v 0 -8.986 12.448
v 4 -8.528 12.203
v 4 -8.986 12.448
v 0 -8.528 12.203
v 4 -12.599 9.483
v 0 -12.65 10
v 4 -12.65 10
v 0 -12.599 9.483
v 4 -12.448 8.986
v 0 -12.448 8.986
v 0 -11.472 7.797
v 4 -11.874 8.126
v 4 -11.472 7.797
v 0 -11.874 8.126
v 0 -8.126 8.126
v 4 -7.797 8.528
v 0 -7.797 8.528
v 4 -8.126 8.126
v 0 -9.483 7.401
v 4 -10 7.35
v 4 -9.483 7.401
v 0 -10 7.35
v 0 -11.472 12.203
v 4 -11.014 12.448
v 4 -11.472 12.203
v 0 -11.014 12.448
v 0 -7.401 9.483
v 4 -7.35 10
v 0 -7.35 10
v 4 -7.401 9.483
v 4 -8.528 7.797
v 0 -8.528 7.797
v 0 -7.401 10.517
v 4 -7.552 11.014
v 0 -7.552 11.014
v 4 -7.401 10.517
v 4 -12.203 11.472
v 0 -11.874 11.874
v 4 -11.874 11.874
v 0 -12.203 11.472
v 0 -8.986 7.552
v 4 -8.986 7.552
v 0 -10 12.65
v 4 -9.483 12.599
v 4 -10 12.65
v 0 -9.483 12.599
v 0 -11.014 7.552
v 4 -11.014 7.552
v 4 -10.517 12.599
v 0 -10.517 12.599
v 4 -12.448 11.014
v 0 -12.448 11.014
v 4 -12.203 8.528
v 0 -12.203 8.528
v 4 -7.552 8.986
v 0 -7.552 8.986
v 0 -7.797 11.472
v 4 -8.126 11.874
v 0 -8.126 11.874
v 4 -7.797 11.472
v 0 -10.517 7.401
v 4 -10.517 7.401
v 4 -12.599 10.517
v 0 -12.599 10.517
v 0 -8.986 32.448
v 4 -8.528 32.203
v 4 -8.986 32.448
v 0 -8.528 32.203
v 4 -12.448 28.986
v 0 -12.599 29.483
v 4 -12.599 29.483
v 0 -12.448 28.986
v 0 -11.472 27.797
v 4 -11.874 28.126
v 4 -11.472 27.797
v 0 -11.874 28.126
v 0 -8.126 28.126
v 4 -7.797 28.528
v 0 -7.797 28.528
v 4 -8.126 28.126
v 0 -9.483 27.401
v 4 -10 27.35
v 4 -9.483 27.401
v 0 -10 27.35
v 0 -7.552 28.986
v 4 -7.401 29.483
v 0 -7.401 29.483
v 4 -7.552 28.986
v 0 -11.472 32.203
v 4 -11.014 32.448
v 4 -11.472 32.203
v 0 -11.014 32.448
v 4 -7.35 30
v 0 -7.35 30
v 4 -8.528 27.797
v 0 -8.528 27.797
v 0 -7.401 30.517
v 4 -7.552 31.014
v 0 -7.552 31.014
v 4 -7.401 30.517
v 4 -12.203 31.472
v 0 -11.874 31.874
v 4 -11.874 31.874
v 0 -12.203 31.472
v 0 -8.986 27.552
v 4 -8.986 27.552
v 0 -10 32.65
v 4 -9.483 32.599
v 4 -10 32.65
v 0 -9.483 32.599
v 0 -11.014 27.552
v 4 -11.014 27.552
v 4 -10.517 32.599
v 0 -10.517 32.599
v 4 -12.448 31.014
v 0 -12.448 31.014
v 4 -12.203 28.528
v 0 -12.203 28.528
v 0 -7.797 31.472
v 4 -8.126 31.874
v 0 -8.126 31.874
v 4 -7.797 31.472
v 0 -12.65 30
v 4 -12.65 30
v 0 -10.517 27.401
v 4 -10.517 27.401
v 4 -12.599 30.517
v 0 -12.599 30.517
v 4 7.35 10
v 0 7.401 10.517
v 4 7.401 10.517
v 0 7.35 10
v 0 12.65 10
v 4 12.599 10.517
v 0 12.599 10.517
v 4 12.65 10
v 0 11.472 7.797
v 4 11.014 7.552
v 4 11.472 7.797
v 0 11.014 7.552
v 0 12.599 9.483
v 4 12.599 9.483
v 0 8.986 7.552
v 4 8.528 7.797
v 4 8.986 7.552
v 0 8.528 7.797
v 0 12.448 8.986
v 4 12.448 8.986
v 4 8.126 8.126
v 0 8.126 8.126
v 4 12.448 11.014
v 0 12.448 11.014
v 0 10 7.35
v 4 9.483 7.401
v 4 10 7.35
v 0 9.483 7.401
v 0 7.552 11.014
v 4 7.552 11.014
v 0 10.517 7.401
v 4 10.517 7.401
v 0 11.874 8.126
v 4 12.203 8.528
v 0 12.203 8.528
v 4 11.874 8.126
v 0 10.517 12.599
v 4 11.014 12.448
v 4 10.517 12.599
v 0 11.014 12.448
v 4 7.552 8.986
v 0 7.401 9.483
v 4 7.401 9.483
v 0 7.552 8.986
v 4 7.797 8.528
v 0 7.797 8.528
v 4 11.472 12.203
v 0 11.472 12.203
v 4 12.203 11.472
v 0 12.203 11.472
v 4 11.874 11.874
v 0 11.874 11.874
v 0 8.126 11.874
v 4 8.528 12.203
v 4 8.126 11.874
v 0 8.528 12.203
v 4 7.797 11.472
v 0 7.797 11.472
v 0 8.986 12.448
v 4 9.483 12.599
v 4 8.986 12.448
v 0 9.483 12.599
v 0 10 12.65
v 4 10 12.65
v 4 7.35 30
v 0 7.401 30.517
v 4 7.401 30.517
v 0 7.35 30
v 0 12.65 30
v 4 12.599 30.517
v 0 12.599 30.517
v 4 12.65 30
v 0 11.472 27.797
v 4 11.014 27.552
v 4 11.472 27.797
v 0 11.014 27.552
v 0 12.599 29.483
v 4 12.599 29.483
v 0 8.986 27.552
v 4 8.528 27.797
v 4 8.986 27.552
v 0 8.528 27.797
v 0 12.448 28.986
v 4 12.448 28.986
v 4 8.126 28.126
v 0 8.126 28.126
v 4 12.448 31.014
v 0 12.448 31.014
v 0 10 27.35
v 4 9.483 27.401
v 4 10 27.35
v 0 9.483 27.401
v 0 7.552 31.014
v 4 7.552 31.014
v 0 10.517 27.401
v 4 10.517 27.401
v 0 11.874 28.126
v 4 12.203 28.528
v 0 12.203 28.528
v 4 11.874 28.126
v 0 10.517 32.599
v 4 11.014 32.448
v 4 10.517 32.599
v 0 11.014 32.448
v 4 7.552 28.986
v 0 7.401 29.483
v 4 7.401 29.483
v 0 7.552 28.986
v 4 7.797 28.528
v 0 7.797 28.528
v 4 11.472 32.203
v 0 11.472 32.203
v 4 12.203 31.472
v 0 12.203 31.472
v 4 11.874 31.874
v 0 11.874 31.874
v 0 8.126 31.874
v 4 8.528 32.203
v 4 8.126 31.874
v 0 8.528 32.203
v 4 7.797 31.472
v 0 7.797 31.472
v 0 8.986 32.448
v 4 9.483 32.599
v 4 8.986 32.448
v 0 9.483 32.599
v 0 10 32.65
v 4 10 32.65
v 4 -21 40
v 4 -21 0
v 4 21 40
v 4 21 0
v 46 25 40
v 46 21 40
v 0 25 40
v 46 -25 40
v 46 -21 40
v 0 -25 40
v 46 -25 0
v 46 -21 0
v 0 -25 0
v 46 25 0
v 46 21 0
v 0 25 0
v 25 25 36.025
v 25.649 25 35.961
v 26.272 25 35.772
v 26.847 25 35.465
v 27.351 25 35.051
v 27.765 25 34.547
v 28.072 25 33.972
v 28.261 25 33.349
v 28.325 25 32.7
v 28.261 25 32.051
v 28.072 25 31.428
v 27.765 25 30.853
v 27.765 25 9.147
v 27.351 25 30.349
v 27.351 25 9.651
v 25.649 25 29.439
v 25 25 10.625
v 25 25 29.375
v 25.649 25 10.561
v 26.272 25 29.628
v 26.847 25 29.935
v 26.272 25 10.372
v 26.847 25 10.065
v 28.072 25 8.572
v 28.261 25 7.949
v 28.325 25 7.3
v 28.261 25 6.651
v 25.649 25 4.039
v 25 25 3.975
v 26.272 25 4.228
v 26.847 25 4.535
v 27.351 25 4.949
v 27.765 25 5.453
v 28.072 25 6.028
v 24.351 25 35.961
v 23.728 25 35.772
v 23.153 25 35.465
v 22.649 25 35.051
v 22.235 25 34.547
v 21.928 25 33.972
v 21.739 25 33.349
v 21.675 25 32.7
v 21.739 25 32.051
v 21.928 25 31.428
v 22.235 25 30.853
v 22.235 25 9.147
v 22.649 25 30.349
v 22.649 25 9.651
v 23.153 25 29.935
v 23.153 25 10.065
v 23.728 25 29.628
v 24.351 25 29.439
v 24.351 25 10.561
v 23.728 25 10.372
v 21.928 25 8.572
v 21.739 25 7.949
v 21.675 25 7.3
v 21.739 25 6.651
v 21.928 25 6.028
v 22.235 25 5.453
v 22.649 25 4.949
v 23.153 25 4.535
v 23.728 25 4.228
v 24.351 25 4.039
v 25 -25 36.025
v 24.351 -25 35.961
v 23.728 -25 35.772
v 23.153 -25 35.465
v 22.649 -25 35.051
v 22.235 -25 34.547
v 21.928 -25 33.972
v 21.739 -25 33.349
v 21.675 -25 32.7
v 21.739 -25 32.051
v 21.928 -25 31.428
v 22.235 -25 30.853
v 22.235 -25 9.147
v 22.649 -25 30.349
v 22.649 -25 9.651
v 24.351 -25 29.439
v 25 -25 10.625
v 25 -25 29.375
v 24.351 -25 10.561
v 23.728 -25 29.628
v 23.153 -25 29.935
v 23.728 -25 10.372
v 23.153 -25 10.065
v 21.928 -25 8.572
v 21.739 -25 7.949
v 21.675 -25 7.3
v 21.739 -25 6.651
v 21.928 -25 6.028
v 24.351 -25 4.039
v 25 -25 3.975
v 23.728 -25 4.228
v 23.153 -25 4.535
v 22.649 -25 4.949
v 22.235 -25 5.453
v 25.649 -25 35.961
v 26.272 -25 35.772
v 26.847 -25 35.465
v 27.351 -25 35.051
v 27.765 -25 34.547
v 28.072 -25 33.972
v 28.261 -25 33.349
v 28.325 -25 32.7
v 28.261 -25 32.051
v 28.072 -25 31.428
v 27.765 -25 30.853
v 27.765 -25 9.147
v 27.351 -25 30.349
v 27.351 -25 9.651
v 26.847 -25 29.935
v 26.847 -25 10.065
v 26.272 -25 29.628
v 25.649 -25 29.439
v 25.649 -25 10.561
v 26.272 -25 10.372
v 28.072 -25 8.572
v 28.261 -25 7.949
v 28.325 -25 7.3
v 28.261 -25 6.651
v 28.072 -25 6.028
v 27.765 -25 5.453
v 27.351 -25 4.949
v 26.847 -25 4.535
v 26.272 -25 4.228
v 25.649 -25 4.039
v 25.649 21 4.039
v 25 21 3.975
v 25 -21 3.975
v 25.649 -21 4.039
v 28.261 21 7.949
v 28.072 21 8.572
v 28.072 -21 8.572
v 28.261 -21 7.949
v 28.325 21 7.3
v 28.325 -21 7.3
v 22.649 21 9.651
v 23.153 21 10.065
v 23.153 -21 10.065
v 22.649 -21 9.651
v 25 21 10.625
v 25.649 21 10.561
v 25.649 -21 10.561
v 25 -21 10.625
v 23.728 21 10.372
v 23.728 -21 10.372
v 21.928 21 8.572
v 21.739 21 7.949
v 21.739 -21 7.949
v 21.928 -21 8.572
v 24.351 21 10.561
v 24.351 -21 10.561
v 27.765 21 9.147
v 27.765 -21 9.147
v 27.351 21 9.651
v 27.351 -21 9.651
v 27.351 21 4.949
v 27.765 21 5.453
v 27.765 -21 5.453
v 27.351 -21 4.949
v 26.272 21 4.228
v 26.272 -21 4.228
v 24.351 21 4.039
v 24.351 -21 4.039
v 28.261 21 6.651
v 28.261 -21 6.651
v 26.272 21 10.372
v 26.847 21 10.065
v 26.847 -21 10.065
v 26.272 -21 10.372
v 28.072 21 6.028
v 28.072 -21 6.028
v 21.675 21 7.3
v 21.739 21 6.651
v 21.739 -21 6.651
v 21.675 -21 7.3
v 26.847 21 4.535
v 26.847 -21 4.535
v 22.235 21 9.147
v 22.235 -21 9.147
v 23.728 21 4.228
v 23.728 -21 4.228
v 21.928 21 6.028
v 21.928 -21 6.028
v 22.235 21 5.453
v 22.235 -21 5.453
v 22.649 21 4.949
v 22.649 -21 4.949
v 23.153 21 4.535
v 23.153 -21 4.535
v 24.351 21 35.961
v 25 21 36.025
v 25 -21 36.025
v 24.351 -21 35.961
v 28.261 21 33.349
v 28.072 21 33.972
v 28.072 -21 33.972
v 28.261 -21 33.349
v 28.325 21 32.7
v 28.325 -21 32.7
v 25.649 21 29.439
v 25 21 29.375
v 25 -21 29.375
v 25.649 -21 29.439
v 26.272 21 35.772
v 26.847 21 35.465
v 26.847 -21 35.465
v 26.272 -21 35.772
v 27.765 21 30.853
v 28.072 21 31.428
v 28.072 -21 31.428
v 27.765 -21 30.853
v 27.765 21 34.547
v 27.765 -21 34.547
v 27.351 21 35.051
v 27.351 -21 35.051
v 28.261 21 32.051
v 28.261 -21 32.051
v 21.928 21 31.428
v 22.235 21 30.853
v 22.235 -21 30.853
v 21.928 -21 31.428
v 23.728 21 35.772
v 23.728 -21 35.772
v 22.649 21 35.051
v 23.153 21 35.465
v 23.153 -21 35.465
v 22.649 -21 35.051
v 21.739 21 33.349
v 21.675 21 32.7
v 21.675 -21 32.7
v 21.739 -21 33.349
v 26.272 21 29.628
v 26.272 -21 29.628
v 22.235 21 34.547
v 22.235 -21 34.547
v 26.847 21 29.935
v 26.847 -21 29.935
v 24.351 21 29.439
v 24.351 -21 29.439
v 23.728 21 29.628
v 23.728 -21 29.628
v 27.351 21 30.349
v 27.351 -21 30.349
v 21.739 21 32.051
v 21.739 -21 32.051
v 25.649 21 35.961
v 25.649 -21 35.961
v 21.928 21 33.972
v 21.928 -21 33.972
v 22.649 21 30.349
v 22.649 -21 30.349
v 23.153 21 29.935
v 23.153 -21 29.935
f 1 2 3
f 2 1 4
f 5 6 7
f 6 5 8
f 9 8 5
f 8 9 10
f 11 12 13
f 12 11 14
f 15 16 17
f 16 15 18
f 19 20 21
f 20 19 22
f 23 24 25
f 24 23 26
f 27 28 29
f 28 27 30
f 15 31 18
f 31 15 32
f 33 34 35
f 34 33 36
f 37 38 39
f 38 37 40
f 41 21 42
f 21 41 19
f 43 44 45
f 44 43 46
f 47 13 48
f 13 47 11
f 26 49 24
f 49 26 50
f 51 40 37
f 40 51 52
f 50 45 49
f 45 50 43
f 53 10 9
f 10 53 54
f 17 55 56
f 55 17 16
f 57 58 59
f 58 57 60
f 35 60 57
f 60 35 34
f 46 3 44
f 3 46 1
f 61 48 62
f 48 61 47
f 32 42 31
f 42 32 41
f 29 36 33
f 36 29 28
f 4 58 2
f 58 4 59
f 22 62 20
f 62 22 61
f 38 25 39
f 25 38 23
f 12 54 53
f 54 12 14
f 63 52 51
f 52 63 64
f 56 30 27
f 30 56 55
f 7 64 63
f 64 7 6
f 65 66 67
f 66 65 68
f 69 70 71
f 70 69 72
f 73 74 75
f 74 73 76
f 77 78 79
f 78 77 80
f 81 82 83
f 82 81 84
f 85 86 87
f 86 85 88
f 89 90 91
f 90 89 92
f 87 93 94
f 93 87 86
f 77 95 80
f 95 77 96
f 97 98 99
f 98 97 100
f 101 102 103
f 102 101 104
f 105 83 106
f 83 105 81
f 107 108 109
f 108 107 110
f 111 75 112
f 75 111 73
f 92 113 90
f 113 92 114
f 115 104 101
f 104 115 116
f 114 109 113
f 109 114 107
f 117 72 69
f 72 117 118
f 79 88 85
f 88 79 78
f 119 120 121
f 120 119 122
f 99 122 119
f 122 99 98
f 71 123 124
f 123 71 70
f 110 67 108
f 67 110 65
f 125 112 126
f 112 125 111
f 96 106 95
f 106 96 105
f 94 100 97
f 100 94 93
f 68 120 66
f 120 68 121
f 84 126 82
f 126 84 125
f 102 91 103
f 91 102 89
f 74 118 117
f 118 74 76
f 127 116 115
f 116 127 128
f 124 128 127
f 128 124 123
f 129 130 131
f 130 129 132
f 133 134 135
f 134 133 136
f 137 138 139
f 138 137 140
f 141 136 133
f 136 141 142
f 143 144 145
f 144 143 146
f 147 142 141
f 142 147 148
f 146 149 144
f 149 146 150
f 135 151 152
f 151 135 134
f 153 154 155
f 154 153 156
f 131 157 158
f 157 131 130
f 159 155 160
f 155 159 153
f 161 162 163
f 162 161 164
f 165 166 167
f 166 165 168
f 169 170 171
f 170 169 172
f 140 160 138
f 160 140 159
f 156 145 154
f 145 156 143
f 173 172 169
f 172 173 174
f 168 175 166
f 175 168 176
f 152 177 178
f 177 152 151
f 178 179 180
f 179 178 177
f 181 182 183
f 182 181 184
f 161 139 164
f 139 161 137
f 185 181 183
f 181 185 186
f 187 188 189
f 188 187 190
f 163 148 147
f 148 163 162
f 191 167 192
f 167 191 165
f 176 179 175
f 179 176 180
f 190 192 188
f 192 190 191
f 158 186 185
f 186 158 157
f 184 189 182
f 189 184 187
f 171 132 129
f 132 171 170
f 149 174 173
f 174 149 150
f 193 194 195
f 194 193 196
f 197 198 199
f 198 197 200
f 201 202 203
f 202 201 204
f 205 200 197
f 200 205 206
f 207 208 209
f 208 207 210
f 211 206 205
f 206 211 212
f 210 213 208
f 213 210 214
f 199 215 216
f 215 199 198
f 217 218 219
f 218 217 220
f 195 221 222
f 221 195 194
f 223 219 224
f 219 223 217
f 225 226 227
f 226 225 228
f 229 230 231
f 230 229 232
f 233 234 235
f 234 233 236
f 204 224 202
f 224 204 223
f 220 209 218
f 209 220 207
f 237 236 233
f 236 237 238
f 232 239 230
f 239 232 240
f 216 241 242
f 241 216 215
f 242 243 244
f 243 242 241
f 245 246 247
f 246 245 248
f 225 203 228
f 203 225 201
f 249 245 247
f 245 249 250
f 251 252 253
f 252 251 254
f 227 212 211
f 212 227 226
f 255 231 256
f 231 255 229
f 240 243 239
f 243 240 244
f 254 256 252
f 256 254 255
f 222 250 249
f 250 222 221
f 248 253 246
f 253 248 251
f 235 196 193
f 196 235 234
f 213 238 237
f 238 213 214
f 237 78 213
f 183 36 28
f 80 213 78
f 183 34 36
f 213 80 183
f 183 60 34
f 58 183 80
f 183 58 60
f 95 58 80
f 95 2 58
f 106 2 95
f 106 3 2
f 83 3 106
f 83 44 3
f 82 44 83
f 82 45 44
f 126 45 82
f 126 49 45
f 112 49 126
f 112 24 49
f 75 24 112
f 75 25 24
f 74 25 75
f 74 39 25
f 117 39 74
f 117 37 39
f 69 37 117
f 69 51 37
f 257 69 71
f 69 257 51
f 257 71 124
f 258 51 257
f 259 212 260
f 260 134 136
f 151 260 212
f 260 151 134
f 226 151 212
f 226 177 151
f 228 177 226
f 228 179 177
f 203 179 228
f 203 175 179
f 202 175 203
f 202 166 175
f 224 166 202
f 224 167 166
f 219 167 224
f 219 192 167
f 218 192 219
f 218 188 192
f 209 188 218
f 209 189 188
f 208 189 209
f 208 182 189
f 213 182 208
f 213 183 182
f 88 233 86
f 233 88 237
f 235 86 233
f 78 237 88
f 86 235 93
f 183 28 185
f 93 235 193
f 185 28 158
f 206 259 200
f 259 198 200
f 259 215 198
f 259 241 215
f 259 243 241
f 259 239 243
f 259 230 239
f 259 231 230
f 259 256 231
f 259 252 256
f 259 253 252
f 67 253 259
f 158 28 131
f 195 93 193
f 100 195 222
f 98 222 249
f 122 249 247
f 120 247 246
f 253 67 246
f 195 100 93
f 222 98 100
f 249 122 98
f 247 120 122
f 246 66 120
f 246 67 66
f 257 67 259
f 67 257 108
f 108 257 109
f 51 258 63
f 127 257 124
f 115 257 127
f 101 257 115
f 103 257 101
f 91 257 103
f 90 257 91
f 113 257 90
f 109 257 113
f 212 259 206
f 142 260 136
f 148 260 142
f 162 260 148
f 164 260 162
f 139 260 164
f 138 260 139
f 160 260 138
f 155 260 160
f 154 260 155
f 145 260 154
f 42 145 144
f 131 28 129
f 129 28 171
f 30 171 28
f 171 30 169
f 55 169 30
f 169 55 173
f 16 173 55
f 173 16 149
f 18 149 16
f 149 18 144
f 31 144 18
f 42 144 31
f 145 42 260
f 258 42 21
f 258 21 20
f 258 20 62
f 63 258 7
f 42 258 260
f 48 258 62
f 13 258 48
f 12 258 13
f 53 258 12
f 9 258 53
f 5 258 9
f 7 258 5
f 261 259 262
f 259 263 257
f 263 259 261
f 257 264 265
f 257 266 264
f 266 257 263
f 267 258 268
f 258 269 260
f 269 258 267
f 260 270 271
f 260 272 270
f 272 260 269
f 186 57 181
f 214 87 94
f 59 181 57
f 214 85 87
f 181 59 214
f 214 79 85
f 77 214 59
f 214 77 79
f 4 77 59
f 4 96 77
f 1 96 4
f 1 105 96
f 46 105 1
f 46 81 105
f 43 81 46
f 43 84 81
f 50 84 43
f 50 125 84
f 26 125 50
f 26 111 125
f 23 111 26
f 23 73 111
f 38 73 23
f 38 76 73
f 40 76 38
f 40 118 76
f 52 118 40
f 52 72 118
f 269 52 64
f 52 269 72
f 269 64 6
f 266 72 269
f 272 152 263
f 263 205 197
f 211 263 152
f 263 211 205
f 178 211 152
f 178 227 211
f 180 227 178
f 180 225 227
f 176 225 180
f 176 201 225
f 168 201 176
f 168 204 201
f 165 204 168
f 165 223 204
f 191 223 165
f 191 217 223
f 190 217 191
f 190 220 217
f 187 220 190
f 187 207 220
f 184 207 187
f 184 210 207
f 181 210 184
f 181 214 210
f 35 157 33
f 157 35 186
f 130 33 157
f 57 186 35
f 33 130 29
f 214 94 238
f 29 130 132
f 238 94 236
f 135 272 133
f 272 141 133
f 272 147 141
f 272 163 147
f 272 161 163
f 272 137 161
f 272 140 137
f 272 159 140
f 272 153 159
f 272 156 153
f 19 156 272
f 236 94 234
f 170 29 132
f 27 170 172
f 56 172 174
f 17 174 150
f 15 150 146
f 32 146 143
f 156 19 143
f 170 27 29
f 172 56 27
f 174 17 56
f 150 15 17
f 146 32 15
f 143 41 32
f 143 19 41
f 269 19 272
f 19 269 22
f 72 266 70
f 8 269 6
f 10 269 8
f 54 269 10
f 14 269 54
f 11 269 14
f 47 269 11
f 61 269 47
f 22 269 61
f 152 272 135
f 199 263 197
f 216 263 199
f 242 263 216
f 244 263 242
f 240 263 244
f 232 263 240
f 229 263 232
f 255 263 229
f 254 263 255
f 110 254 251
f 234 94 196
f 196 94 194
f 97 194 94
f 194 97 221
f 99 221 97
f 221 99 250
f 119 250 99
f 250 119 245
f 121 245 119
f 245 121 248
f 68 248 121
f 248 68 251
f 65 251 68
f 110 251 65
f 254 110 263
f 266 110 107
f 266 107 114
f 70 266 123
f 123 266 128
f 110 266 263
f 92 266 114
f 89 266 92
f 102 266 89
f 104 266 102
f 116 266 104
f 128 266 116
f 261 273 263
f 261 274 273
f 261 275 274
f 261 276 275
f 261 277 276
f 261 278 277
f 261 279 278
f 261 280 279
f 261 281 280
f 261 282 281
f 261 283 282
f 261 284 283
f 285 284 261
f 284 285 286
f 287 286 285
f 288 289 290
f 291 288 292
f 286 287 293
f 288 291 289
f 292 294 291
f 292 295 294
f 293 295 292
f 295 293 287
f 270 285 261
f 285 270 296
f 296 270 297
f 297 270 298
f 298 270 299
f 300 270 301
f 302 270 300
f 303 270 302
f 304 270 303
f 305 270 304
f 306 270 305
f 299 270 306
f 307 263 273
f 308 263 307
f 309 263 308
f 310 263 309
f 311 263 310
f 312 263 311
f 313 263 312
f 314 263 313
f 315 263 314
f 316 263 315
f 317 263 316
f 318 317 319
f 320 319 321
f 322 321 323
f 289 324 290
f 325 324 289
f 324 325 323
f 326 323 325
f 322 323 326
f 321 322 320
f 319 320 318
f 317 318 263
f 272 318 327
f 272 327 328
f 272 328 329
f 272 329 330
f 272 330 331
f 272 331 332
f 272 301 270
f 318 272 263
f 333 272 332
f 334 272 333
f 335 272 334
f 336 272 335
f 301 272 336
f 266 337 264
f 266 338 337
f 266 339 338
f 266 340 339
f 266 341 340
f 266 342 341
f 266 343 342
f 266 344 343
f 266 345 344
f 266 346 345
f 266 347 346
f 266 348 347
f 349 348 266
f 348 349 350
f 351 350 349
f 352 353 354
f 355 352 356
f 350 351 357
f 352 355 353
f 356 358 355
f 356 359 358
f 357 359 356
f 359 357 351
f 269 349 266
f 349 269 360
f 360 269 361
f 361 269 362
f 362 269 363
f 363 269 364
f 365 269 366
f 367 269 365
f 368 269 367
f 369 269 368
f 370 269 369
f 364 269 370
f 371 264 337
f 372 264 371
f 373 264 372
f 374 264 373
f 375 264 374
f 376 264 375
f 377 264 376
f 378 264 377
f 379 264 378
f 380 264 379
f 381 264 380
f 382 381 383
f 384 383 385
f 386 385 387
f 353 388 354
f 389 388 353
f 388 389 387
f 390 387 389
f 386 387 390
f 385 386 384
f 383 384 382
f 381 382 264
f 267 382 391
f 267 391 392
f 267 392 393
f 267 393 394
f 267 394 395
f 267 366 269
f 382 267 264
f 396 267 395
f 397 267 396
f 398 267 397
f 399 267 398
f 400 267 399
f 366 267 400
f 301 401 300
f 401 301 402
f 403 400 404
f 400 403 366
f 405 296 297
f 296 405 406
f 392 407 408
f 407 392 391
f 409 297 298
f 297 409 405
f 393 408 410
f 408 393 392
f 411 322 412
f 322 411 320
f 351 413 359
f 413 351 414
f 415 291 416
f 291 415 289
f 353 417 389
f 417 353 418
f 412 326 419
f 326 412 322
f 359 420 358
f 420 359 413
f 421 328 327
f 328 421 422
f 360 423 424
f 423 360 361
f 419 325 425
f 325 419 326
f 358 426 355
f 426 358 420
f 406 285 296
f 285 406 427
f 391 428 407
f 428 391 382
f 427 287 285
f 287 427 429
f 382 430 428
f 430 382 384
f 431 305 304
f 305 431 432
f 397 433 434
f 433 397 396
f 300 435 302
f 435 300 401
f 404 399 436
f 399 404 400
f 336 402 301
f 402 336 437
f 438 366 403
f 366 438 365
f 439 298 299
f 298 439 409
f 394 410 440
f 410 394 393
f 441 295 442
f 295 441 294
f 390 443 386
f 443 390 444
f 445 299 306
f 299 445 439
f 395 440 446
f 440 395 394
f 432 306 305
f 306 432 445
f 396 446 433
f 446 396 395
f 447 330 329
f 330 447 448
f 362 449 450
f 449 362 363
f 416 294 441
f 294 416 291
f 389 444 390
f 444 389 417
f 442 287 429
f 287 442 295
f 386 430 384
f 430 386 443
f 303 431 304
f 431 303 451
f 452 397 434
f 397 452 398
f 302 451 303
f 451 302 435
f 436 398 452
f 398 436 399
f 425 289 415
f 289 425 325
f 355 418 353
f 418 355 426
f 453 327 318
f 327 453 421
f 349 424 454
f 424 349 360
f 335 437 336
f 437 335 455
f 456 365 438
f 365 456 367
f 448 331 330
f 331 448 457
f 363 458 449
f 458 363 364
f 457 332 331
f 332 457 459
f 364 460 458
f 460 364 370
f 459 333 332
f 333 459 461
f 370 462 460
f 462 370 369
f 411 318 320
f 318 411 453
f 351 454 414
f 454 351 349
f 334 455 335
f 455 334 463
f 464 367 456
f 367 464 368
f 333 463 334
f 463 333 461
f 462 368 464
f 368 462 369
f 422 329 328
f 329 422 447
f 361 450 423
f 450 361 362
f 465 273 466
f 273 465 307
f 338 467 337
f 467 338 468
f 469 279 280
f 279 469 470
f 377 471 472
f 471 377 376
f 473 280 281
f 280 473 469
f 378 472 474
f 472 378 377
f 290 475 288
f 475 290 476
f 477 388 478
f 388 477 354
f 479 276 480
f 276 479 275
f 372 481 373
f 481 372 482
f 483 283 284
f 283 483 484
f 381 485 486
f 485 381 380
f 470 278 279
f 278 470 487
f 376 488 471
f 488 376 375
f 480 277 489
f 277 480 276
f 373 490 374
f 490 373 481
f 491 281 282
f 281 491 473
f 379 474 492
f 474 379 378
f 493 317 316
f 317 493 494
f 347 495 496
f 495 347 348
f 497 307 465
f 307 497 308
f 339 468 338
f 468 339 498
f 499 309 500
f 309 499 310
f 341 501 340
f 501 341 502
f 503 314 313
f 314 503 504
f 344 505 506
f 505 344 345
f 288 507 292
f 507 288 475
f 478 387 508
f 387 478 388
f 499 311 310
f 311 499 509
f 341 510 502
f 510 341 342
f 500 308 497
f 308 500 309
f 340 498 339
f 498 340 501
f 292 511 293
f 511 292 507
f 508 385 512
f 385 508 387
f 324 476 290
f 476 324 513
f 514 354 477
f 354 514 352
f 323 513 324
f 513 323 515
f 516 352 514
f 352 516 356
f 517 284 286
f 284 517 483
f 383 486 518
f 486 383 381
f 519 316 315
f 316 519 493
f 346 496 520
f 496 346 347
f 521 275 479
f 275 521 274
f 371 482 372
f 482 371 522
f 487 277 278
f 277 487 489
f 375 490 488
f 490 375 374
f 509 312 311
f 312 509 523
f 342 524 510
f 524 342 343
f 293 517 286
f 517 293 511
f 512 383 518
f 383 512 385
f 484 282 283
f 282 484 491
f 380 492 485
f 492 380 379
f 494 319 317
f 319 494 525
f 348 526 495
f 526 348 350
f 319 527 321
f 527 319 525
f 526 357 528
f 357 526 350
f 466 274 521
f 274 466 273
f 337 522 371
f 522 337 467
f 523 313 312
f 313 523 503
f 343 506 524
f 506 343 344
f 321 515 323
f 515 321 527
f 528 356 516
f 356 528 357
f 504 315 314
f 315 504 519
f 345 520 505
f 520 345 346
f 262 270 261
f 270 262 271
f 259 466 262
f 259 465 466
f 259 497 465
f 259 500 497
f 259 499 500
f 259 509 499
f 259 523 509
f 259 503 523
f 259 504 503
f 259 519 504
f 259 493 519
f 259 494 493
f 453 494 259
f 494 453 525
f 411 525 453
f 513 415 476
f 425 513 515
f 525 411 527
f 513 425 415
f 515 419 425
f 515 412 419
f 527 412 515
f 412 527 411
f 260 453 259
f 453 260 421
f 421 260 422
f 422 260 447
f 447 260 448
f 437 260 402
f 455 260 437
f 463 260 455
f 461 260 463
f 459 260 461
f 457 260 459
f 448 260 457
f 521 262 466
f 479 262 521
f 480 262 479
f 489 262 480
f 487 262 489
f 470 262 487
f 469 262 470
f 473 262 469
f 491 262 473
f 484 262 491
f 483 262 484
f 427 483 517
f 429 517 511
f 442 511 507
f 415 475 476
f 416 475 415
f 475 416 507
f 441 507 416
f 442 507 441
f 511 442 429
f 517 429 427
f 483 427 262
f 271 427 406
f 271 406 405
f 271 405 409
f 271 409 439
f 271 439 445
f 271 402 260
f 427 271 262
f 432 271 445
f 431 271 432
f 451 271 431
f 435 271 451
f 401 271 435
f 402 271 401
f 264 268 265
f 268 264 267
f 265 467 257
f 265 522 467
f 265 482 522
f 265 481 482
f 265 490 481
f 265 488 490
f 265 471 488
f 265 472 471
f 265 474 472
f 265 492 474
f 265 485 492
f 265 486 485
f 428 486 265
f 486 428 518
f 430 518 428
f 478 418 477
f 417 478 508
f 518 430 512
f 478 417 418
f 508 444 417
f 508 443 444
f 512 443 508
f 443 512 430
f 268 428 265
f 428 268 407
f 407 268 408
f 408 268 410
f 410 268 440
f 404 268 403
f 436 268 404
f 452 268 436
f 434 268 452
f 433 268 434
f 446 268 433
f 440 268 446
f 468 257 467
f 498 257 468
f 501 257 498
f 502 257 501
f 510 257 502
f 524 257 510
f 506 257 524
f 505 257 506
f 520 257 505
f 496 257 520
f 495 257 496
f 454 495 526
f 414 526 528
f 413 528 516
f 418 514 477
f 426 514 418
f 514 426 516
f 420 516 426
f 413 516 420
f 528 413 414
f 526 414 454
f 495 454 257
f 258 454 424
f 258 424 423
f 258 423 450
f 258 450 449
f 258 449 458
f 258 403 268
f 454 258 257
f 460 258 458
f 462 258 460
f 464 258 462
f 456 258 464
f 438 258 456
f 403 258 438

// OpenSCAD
// AutoFAB powered monorail: brush saddle (inverted U). DRAFT v0, parametric.
// R&D, NOT part of the current kit. Licence: CERN-OHL-P-2.0.
// Units: mm. The rail is 2040 V-slot standing on edge (Z = travel axis; travel is probably horizontal, to be confirmed).
// Cross-section in the XY plane: X = 20 mm (front/back faces), Y = 40 mm (side faces, +12 V left / GND right).
// The saddle straddles the front 20 mm face; its two legs run alongside the left and right 40 mm faces
// and each leg holds one brush block facing the 14 mm centre channel.
// NOTE: the bridge on the front face must clear the front-face wheels/rack. VERIFY against the plate layout.
// Every value marked VERIFY must be measured on real parts before printing.

/* [Rail] */
rail_w        = 20.0;   // 2040 short side (OpenBuilds)
rail_d        = 40.0;   // 2040 long side (OpenBuilds)
rail_clear    = 1.0;    // air gap, saddle to rail, each side (no rubbing)

/* [Brush block] VERIFY all: Hoypeyfiy dims not published in our sources */
blk_w         = 20.0;   // across the brush face. VERIFY
blk_h         = 32.0;   // along travel (two brushes, 11.1 c-c). VERIFY
blk_t         = 12.0;   // block thickness, mount face to brush face at nominal. VERIFY
blk_hole_d    = 6.35;   // 1/4" holes (spec)
blk_hole_pitch= 25.4;   // 1" centres (spec)
brush_pitch   = 11.1;   // tandem brush spacing (spec), for reference only
preload       = 3.0;    // brush compression, 2..4 (spec)

/* [Saddle] */
wall          = 4.0;    // PETG/ASA: 4 mm webs, 100% perimeters around holes
leg_len       = 40.0;   // along travel (Z)
fdm_hole_clear= 0.3;    // add to diameter for FDM holes (horizontal, PETG)
bolt_d        = 6.35 + fdm_hole_clear;  // 1/4" bolts, or M6 (6.0+0.3)
plate_bolt_d  = 5.0 + fdm_hole_clear;   // M5 to V-slider plate (OpenBuilds plates use M5)
plate_pitch   = 20.0;   // VERIFY on the actual plate's hole grid

// The 40 mm side faces are 20 mm apart (rail_w), so the legs sit either side of the 20 mm width.
// Each block sits between its leg and the copper. Preload is set by SHIMS between the block and the leg:
// leg inner gap = rail_w + 2*(blk_t - preload + shim_nom).
shim_nom  = 2.0;        // nominal shim stack; 0..4 mm of printed shims gives 2..4 mm preload with margin
leg_gap_y = rail_w + 2*(blk_t - preload + shim_nom);
leg_depth = rail_clear + rail_d + rail_clear; // legs span the full 40 mm face depth

module leg(side=1) {
  difference() {
    translate([0, side>0 ? leg_gap_y/2 : -leg_gap_y/2 - wall, 0])
      cube([wall + leg_depth, wall, leg_len]);
    // two 1/4" holes at 1" centres, centred on the 14 mm channel (= mid-depth of the 40 mm face)
    for (z=[leg_len/2 - blk_hole_pitch/2, leg_len/2 + blk_hole_pitch/2])
      translate([wall + rail_clear + rail_d/2, 0, z])
        rotate([90,0,0]) cylinder(d=bolt_d, h=200, center=true, $fn=32);
  }
}

// Bridge: across the FRONT 20 mm face; bolts to the V-slider plate.
module bridge() {
  difference() {
    translate([0, -leg_gap_y/2 - wall, 0]) cube([wall, leg_gap_y + 2*wall, leg_len]);
    for (y=[-plate_pitch/2, plate_pitch/2], z=[leg_len/2 - plate_pitch/2, leg_len/2 + plate_pitch/2])
      translate([0, y, z]) rotate([0,90,0]) cylinder(d=plate_bolt_d, h=3*wall, center=true, $fn=32);
  }
}

// Printable shim: 1/4" holes at 1" centres
module shim(t=1) difference() {
  cube([blk_w, t, blk_hole_pitch + 12]);
  for (z=[6, 6+blk_hole_pitch]) translate([blk_w/2,0,z]) rotate([90,0,0]) cylinder(d=bolt_d,h=10,center=true,$fn=32);
}

bridge(); leg(1); leg(-1);
